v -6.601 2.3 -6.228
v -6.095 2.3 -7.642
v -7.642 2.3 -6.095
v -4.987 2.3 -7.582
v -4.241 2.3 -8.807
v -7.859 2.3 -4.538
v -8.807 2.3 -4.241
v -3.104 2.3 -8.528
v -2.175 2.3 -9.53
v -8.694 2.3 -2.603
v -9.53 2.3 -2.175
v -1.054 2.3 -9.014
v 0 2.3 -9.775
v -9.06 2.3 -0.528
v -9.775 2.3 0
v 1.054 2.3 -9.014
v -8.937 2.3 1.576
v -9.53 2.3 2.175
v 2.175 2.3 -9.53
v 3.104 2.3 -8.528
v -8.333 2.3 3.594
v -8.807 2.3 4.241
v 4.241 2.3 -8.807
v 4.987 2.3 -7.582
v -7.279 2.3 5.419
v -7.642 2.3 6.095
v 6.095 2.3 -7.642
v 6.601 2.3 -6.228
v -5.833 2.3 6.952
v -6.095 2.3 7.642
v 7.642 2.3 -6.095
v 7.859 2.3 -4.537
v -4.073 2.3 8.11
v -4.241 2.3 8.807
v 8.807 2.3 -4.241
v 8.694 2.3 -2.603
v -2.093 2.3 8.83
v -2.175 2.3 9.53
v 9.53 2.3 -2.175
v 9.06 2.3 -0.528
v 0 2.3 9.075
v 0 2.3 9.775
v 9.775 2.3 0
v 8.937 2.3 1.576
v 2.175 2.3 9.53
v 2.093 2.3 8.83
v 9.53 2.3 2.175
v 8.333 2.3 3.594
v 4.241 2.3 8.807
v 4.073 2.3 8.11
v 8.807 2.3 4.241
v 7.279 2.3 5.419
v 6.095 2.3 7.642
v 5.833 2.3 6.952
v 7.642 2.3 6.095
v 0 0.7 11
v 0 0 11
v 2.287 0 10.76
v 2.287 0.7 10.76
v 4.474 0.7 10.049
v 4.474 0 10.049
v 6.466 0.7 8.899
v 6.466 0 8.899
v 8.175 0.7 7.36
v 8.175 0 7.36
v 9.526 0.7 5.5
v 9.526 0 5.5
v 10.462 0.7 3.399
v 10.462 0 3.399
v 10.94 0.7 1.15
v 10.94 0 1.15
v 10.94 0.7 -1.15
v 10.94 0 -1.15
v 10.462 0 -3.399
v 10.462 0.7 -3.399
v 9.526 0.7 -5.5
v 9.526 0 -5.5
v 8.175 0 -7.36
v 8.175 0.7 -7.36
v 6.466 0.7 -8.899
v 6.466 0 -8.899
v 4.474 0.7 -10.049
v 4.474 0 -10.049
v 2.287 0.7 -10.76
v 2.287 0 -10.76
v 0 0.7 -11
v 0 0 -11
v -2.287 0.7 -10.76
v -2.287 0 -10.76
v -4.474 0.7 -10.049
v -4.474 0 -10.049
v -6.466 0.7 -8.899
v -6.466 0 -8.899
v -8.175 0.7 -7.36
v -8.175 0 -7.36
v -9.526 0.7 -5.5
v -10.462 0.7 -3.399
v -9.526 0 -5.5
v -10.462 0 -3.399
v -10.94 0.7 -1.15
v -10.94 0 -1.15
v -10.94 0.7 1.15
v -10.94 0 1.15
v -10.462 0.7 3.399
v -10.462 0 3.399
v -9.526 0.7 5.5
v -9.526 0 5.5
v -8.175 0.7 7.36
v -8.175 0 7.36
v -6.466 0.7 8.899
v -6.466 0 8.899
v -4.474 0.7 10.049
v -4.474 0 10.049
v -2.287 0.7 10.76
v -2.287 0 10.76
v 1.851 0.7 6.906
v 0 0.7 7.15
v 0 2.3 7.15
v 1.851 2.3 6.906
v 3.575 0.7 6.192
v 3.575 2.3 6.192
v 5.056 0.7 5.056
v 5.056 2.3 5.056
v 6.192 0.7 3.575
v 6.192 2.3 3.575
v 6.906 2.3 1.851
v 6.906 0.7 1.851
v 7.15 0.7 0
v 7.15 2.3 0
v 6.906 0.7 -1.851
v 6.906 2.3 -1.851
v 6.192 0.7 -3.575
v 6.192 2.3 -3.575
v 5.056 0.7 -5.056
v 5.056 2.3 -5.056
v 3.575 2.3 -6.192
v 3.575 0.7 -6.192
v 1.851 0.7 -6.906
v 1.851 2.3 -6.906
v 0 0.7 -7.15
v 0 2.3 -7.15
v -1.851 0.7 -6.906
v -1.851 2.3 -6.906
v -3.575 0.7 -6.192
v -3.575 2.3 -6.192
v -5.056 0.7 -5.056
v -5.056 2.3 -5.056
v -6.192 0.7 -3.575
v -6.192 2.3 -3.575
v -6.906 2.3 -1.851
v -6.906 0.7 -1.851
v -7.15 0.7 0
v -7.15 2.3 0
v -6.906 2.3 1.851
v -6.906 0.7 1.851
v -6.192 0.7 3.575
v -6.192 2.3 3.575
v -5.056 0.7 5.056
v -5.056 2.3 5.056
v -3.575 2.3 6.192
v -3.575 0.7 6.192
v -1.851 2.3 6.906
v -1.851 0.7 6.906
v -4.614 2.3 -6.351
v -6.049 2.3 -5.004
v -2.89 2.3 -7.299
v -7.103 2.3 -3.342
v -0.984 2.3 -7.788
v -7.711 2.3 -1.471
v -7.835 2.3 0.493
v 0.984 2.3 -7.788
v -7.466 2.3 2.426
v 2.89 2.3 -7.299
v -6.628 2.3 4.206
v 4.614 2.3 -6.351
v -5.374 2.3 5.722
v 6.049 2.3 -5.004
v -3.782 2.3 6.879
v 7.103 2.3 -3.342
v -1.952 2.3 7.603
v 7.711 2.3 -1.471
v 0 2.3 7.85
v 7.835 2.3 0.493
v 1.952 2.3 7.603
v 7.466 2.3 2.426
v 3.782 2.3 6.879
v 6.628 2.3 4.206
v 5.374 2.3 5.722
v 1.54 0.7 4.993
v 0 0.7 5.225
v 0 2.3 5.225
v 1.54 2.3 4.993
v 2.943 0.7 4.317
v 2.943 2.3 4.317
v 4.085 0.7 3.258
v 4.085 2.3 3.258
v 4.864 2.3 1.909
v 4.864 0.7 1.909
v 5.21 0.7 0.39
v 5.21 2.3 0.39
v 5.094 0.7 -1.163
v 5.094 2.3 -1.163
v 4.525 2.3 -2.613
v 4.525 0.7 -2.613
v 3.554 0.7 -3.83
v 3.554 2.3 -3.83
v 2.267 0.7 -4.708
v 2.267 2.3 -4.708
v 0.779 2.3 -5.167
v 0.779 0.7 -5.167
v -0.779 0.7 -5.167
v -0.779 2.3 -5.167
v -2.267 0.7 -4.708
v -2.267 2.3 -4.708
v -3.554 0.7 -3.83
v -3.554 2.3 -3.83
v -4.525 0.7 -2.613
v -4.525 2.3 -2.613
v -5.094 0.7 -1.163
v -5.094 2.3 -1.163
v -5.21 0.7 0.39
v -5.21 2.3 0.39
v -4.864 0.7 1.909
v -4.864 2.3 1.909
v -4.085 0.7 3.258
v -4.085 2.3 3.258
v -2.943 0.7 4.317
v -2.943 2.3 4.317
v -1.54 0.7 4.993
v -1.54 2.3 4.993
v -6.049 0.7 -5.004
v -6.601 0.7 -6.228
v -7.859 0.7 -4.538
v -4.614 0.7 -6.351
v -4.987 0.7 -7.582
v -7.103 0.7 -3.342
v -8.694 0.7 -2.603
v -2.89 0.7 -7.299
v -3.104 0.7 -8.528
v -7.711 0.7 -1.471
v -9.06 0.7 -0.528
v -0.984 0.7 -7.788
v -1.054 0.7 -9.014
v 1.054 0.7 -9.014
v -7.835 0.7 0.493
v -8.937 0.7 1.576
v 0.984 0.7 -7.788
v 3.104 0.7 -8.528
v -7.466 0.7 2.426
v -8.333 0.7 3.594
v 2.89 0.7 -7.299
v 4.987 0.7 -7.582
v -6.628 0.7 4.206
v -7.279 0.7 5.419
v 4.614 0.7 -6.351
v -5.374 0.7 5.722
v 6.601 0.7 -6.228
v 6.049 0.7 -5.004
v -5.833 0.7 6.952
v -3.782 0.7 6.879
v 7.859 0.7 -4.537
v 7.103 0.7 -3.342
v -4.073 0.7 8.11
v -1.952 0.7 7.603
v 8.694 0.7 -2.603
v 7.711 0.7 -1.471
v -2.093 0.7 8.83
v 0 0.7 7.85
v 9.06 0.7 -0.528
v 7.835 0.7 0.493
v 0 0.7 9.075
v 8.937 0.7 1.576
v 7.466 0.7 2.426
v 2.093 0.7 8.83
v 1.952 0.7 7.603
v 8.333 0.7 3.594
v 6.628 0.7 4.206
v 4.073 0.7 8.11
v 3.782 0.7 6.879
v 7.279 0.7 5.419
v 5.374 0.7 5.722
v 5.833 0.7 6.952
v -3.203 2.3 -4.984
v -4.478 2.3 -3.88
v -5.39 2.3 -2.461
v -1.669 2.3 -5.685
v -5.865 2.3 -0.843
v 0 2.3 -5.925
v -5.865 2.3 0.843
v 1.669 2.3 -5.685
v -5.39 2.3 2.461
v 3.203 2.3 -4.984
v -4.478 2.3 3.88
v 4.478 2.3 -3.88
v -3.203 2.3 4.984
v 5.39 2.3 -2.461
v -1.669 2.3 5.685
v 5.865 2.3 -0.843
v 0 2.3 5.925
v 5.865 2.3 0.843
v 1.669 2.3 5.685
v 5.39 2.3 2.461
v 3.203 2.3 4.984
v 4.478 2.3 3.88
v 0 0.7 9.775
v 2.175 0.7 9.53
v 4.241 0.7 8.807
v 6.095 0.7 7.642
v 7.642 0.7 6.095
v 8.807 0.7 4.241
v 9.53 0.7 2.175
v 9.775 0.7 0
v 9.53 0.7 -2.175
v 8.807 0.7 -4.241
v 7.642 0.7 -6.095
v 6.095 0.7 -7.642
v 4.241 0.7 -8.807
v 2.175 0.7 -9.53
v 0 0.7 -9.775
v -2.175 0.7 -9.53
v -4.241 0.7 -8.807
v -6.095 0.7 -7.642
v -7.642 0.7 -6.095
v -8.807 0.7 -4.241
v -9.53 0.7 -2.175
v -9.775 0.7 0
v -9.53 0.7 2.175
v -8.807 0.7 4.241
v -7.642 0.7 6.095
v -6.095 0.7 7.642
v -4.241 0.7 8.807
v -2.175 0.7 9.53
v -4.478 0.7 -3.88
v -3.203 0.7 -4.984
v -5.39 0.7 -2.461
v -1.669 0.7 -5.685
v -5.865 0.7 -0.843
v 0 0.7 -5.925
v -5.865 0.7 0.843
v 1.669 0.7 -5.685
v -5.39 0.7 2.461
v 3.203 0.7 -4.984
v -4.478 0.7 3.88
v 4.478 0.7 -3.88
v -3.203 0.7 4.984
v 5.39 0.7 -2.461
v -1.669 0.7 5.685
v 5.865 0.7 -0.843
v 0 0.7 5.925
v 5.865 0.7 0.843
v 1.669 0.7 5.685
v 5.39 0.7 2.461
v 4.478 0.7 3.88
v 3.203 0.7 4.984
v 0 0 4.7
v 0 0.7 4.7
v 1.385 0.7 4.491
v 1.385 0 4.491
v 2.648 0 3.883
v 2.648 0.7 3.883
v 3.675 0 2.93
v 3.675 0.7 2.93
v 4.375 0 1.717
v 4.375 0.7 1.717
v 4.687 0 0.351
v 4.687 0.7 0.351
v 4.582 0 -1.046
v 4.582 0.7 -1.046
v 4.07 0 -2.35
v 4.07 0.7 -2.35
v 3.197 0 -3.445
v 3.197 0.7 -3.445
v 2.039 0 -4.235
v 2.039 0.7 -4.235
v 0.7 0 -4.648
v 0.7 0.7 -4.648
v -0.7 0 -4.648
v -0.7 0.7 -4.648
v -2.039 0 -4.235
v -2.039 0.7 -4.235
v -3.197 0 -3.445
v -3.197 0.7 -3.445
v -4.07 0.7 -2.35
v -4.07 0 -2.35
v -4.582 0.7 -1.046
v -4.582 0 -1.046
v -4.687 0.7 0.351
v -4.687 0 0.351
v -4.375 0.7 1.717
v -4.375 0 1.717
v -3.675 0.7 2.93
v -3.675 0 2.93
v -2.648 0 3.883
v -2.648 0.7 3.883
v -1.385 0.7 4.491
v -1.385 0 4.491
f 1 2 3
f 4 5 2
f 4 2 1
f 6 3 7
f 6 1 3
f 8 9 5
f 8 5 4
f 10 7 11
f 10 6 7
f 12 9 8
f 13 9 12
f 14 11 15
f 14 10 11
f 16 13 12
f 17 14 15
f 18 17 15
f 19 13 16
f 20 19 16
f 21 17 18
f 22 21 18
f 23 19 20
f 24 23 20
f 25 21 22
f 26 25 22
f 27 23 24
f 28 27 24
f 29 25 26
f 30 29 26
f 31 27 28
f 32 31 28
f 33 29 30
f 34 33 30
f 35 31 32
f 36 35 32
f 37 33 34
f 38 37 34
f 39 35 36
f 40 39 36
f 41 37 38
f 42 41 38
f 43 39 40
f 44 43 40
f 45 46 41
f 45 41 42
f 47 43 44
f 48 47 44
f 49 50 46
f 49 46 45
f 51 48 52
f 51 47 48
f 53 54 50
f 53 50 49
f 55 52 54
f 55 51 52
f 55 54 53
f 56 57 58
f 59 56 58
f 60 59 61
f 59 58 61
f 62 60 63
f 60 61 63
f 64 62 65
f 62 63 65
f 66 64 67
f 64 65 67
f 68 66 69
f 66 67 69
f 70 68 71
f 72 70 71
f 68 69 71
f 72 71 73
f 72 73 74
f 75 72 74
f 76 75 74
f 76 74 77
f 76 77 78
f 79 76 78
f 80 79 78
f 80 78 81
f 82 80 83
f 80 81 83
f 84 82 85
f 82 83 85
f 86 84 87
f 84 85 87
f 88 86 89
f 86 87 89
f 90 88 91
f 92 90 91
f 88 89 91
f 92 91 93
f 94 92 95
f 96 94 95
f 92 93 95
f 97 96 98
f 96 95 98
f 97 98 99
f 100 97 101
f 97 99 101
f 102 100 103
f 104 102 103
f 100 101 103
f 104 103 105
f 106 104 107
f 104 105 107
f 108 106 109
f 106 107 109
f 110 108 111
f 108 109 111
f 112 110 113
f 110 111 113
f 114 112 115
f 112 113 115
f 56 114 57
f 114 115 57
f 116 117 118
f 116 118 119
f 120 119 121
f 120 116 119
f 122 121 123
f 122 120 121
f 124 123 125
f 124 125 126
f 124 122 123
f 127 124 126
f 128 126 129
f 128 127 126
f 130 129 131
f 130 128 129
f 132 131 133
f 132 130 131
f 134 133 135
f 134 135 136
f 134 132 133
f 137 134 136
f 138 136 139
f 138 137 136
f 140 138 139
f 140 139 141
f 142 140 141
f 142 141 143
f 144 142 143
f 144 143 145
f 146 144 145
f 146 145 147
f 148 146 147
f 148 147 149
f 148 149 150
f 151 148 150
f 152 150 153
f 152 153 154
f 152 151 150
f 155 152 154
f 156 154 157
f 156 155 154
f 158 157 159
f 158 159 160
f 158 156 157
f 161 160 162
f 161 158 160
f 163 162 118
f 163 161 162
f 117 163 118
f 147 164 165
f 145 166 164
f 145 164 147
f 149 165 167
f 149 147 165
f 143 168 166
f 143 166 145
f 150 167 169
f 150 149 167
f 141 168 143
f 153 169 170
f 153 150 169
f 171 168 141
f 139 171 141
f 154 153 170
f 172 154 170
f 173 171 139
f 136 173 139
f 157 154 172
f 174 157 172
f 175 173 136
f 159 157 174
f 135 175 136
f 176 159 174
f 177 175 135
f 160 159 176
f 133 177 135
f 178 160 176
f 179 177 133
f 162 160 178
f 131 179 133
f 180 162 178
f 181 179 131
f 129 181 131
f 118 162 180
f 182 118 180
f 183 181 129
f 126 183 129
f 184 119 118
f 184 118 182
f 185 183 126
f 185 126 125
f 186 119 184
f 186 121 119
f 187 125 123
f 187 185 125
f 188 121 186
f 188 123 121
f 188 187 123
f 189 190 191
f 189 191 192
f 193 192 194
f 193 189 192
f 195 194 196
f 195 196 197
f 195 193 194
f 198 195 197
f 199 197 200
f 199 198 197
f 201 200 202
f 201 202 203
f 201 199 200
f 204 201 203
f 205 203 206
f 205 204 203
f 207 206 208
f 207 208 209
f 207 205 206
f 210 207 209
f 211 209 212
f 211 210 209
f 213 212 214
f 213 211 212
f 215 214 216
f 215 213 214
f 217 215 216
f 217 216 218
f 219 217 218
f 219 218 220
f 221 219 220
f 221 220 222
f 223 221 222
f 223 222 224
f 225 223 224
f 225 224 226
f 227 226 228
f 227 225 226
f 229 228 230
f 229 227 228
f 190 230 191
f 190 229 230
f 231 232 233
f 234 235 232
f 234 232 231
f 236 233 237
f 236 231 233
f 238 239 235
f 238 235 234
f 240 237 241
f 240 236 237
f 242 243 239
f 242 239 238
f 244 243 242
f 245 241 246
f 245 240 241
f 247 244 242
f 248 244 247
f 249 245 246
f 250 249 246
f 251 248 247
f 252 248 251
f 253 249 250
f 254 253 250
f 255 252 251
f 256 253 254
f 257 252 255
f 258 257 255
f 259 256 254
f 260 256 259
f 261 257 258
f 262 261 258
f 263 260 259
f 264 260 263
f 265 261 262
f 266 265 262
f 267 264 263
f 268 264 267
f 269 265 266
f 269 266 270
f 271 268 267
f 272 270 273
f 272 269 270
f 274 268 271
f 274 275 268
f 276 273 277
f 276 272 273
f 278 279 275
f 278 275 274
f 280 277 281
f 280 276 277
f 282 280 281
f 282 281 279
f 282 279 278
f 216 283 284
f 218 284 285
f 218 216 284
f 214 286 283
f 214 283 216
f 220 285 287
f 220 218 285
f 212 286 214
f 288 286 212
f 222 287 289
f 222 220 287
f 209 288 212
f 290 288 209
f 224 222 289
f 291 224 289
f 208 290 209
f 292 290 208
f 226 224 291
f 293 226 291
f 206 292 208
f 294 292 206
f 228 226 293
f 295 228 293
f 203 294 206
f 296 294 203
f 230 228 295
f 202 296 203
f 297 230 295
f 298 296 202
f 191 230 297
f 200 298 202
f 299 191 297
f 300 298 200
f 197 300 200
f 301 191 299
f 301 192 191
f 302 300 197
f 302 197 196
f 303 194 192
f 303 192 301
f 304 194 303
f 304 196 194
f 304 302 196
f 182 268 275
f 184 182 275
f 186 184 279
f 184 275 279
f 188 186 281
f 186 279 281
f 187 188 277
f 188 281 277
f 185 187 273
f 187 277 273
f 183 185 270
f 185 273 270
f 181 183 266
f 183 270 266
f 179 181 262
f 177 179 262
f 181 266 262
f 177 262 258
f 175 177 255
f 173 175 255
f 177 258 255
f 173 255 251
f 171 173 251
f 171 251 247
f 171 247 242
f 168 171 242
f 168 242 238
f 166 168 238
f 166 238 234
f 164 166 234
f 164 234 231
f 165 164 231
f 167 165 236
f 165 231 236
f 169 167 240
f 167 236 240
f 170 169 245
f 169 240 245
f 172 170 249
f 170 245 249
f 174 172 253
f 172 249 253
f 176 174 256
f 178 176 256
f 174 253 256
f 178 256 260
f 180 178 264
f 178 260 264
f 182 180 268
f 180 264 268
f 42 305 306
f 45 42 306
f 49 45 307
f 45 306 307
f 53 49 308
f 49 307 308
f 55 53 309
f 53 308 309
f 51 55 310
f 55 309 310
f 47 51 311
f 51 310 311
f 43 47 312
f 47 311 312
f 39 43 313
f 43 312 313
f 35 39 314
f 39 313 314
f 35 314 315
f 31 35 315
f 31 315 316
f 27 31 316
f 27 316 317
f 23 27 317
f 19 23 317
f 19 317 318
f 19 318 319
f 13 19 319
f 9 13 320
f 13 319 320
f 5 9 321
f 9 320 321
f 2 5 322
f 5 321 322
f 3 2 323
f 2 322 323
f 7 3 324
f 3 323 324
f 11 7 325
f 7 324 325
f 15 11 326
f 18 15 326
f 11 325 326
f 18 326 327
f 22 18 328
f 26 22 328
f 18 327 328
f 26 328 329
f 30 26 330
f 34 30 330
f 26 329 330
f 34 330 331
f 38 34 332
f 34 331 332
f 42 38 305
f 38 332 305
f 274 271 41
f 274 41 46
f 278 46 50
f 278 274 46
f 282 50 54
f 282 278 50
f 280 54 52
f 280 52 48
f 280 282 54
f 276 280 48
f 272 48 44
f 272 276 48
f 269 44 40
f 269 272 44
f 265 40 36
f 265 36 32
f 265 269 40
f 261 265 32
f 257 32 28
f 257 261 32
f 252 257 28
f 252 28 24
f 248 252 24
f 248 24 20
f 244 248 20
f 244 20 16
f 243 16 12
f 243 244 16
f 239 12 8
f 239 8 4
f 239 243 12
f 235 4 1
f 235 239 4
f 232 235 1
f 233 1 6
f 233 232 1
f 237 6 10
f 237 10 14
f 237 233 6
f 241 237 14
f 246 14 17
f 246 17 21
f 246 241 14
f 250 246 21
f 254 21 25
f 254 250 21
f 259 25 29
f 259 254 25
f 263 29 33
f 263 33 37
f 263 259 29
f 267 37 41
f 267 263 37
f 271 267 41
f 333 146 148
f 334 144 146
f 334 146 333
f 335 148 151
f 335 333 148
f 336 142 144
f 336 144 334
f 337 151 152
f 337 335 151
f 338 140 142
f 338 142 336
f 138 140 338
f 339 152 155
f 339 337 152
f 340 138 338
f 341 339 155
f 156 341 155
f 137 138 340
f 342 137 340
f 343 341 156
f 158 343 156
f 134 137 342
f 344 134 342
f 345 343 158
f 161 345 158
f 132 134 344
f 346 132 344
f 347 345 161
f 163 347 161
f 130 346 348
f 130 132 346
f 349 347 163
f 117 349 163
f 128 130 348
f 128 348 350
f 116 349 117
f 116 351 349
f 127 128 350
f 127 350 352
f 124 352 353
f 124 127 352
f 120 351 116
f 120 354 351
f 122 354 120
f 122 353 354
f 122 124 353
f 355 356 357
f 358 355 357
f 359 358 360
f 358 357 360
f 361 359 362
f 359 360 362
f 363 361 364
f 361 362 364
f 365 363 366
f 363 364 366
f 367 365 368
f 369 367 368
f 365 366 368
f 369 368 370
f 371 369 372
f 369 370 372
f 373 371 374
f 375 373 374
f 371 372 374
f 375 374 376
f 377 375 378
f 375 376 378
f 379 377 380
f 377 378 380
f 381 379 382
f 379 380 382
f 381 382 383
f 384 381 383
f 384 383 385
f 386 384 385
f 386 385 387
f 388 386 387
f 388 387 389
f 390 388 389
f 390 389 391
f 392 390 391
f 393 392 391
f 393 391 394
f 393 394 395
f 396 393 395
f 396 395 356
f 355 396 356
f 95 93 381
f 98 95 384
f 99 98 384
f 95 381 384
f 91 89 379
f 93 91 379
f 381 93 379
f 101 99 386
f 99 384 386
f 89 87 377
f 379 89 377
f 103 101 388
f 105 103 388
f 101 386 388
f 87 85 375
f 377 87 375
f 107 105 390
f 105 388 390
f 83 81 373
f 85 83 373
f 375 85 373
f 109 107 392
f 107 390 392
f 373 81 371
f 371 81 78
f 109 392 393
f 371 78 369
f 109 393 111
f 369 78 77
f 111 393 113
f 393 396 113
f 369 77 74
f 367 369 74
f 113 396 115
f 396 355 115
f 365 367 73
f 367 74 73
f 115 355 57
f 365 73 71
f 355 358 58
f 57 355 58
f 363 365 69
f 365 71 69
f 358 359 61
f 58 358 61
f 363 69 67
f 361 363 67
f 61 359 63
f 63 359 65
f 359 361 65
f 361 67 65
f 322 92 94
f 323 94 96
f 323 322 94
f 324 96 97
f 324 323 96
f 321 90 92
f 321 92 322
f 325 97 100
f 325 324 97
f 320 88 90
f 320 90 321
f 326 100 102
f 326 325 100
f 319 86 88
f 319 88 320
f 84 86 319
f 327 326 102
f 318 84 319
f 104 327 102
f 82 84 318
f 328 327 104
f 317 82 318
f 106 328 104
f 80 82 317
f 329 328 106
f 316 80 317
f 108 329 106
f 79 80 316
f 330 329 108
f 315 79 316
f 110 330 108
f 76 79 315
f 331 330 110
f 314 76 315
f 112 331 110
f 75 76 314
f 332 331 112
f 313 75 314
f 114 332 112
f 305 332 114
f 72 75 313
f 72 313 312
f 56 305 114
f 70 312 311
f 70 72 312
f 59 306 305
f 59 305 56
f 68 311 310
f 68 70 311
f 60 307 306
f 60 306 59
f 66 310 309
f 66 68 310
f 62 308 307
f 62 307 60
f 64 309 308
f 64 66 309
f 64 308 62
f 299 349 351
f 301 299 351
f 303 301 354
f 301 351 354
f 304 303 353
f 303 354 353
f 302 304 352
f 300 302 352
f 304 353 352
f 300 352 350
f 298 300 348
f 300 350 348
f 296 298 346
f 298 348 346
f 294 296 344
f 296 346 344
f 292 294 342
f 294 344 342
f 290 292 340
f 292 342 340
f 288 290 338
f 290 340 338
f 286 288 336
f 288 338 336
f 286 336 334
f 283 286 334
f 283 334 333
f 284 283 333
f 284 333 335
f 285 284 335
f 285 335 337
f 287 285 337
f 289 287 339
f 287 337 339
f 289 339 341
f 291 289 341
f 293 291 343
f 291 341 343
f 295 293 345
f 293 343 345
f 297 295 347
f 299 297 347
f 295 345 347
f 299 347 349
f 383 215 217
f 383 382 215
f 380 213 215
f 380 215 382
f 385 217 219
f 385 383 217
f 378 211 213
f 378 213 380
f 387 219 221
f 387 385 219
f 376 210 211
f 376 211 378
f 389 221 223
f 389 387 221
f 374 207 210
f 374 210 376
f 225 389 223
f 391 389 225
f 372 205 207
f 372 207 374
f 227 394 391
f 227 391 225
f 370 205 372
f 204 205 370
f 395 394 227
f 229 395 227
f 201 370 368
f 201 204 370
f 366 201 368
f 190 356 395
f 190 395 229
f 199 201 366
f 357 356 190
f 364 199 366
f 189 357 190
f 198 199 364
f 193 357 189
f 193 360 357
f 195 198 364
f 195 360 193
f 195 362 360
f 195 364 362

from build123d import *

# Parameters (mm, degrees)
CROQUIS1_R     = 11
EXTRUIR1_DEPTH = 0.7
CROQUIS2_R     = 9.775
CROQUIS2_R_2   = 9.075
CROQUIS2_R_3   = 7.85
CROQUIS2_R_4   = 7.15
CROQUIS2_R_5   = 5.925
CROQUIS2_R_6   = 5.225
EXTRUIR2_DEPTH = 1.6
CROQUIS3_R     = 4.7
EXTRUIR3_DEPTH = 1.6


with BuildPart() as part:
    # Croquis1 → Extruir1 (new body)
    with BuildSketch(Plane(origin=(0, 0, 0), x_dir=(1, 0, 0), z_dir=(0, 1, 0))):
        with Locations(Location((0, 0, 0), (0, 0, 270))):
            Circle(CROQUIS1_R)
    extrude(amount=EXTRUIR1_DEPTH)

    # Croquis2 → Extruir2 (add)
    # profile 1 of 3: a face of its own
    with BuildSketch(Plane(origin=(0, 0.7, 0), x_dir=(1, 0, 0), z_dir=(0, 1, 0))):
        with Locations(Location((0, 0, 0), (0, 0, 270))):
            Circle(CROQUIS2_R)
        with Locations(Location((0, 0, 0), (0, 0, 270))):
            Circle(CROQUIS2_R_2, mode=Mode.SUBTRACT)
    # profile 2 of 3: a face of its own
    with BuildSketch(Plane(origin=(0, 0.7, 0), x_dir=(1, 0, 0), z_dir=(0, 1, 0))):
        with Locations(Location((0, 0, 0), (0, 0, 270))):
            Circle(CROQUIS2_R_3)
        with Locations(Location((0, 0, 0), (0, 0, 270))):
            Circle(CROQUIS2_R_4, mode=Mode.SUBTRACT)
    # profile 3 of 3: a face of its own
    with BuildSketch(Plane(origin=(0, 0.7, 0), x_dir=(1, 0, 0), z_dir=(0, 1, 0))):
        with Locations(Location((0, 0, 0), (0, 0, 270))):
            Circle(CROQUIS2_R_5)
        with Locations(Location((0, 0, 0), (0, 0, 270))):
            Circle(CROQUIS2_R_6, mode=Mode.SUBTRACT)
    extrude(amount=EXTRUIR2_DEPTH)

    # Croquis3 → Extruir3 (cut)
    with BuildSketch(Plane(origin=(0, 0.7, 0), x_dir=(1, 0, 0), z_dir=(0, 1, 0))):
        with Locations(Location((0, 0, 0), (0, 0, 270))):
            Circle(CROQUIS3_R)
    extrude(amount=-EXTRUIR3_DEPTH, mode=Mode.SUBTRACT)


solid = part.part
